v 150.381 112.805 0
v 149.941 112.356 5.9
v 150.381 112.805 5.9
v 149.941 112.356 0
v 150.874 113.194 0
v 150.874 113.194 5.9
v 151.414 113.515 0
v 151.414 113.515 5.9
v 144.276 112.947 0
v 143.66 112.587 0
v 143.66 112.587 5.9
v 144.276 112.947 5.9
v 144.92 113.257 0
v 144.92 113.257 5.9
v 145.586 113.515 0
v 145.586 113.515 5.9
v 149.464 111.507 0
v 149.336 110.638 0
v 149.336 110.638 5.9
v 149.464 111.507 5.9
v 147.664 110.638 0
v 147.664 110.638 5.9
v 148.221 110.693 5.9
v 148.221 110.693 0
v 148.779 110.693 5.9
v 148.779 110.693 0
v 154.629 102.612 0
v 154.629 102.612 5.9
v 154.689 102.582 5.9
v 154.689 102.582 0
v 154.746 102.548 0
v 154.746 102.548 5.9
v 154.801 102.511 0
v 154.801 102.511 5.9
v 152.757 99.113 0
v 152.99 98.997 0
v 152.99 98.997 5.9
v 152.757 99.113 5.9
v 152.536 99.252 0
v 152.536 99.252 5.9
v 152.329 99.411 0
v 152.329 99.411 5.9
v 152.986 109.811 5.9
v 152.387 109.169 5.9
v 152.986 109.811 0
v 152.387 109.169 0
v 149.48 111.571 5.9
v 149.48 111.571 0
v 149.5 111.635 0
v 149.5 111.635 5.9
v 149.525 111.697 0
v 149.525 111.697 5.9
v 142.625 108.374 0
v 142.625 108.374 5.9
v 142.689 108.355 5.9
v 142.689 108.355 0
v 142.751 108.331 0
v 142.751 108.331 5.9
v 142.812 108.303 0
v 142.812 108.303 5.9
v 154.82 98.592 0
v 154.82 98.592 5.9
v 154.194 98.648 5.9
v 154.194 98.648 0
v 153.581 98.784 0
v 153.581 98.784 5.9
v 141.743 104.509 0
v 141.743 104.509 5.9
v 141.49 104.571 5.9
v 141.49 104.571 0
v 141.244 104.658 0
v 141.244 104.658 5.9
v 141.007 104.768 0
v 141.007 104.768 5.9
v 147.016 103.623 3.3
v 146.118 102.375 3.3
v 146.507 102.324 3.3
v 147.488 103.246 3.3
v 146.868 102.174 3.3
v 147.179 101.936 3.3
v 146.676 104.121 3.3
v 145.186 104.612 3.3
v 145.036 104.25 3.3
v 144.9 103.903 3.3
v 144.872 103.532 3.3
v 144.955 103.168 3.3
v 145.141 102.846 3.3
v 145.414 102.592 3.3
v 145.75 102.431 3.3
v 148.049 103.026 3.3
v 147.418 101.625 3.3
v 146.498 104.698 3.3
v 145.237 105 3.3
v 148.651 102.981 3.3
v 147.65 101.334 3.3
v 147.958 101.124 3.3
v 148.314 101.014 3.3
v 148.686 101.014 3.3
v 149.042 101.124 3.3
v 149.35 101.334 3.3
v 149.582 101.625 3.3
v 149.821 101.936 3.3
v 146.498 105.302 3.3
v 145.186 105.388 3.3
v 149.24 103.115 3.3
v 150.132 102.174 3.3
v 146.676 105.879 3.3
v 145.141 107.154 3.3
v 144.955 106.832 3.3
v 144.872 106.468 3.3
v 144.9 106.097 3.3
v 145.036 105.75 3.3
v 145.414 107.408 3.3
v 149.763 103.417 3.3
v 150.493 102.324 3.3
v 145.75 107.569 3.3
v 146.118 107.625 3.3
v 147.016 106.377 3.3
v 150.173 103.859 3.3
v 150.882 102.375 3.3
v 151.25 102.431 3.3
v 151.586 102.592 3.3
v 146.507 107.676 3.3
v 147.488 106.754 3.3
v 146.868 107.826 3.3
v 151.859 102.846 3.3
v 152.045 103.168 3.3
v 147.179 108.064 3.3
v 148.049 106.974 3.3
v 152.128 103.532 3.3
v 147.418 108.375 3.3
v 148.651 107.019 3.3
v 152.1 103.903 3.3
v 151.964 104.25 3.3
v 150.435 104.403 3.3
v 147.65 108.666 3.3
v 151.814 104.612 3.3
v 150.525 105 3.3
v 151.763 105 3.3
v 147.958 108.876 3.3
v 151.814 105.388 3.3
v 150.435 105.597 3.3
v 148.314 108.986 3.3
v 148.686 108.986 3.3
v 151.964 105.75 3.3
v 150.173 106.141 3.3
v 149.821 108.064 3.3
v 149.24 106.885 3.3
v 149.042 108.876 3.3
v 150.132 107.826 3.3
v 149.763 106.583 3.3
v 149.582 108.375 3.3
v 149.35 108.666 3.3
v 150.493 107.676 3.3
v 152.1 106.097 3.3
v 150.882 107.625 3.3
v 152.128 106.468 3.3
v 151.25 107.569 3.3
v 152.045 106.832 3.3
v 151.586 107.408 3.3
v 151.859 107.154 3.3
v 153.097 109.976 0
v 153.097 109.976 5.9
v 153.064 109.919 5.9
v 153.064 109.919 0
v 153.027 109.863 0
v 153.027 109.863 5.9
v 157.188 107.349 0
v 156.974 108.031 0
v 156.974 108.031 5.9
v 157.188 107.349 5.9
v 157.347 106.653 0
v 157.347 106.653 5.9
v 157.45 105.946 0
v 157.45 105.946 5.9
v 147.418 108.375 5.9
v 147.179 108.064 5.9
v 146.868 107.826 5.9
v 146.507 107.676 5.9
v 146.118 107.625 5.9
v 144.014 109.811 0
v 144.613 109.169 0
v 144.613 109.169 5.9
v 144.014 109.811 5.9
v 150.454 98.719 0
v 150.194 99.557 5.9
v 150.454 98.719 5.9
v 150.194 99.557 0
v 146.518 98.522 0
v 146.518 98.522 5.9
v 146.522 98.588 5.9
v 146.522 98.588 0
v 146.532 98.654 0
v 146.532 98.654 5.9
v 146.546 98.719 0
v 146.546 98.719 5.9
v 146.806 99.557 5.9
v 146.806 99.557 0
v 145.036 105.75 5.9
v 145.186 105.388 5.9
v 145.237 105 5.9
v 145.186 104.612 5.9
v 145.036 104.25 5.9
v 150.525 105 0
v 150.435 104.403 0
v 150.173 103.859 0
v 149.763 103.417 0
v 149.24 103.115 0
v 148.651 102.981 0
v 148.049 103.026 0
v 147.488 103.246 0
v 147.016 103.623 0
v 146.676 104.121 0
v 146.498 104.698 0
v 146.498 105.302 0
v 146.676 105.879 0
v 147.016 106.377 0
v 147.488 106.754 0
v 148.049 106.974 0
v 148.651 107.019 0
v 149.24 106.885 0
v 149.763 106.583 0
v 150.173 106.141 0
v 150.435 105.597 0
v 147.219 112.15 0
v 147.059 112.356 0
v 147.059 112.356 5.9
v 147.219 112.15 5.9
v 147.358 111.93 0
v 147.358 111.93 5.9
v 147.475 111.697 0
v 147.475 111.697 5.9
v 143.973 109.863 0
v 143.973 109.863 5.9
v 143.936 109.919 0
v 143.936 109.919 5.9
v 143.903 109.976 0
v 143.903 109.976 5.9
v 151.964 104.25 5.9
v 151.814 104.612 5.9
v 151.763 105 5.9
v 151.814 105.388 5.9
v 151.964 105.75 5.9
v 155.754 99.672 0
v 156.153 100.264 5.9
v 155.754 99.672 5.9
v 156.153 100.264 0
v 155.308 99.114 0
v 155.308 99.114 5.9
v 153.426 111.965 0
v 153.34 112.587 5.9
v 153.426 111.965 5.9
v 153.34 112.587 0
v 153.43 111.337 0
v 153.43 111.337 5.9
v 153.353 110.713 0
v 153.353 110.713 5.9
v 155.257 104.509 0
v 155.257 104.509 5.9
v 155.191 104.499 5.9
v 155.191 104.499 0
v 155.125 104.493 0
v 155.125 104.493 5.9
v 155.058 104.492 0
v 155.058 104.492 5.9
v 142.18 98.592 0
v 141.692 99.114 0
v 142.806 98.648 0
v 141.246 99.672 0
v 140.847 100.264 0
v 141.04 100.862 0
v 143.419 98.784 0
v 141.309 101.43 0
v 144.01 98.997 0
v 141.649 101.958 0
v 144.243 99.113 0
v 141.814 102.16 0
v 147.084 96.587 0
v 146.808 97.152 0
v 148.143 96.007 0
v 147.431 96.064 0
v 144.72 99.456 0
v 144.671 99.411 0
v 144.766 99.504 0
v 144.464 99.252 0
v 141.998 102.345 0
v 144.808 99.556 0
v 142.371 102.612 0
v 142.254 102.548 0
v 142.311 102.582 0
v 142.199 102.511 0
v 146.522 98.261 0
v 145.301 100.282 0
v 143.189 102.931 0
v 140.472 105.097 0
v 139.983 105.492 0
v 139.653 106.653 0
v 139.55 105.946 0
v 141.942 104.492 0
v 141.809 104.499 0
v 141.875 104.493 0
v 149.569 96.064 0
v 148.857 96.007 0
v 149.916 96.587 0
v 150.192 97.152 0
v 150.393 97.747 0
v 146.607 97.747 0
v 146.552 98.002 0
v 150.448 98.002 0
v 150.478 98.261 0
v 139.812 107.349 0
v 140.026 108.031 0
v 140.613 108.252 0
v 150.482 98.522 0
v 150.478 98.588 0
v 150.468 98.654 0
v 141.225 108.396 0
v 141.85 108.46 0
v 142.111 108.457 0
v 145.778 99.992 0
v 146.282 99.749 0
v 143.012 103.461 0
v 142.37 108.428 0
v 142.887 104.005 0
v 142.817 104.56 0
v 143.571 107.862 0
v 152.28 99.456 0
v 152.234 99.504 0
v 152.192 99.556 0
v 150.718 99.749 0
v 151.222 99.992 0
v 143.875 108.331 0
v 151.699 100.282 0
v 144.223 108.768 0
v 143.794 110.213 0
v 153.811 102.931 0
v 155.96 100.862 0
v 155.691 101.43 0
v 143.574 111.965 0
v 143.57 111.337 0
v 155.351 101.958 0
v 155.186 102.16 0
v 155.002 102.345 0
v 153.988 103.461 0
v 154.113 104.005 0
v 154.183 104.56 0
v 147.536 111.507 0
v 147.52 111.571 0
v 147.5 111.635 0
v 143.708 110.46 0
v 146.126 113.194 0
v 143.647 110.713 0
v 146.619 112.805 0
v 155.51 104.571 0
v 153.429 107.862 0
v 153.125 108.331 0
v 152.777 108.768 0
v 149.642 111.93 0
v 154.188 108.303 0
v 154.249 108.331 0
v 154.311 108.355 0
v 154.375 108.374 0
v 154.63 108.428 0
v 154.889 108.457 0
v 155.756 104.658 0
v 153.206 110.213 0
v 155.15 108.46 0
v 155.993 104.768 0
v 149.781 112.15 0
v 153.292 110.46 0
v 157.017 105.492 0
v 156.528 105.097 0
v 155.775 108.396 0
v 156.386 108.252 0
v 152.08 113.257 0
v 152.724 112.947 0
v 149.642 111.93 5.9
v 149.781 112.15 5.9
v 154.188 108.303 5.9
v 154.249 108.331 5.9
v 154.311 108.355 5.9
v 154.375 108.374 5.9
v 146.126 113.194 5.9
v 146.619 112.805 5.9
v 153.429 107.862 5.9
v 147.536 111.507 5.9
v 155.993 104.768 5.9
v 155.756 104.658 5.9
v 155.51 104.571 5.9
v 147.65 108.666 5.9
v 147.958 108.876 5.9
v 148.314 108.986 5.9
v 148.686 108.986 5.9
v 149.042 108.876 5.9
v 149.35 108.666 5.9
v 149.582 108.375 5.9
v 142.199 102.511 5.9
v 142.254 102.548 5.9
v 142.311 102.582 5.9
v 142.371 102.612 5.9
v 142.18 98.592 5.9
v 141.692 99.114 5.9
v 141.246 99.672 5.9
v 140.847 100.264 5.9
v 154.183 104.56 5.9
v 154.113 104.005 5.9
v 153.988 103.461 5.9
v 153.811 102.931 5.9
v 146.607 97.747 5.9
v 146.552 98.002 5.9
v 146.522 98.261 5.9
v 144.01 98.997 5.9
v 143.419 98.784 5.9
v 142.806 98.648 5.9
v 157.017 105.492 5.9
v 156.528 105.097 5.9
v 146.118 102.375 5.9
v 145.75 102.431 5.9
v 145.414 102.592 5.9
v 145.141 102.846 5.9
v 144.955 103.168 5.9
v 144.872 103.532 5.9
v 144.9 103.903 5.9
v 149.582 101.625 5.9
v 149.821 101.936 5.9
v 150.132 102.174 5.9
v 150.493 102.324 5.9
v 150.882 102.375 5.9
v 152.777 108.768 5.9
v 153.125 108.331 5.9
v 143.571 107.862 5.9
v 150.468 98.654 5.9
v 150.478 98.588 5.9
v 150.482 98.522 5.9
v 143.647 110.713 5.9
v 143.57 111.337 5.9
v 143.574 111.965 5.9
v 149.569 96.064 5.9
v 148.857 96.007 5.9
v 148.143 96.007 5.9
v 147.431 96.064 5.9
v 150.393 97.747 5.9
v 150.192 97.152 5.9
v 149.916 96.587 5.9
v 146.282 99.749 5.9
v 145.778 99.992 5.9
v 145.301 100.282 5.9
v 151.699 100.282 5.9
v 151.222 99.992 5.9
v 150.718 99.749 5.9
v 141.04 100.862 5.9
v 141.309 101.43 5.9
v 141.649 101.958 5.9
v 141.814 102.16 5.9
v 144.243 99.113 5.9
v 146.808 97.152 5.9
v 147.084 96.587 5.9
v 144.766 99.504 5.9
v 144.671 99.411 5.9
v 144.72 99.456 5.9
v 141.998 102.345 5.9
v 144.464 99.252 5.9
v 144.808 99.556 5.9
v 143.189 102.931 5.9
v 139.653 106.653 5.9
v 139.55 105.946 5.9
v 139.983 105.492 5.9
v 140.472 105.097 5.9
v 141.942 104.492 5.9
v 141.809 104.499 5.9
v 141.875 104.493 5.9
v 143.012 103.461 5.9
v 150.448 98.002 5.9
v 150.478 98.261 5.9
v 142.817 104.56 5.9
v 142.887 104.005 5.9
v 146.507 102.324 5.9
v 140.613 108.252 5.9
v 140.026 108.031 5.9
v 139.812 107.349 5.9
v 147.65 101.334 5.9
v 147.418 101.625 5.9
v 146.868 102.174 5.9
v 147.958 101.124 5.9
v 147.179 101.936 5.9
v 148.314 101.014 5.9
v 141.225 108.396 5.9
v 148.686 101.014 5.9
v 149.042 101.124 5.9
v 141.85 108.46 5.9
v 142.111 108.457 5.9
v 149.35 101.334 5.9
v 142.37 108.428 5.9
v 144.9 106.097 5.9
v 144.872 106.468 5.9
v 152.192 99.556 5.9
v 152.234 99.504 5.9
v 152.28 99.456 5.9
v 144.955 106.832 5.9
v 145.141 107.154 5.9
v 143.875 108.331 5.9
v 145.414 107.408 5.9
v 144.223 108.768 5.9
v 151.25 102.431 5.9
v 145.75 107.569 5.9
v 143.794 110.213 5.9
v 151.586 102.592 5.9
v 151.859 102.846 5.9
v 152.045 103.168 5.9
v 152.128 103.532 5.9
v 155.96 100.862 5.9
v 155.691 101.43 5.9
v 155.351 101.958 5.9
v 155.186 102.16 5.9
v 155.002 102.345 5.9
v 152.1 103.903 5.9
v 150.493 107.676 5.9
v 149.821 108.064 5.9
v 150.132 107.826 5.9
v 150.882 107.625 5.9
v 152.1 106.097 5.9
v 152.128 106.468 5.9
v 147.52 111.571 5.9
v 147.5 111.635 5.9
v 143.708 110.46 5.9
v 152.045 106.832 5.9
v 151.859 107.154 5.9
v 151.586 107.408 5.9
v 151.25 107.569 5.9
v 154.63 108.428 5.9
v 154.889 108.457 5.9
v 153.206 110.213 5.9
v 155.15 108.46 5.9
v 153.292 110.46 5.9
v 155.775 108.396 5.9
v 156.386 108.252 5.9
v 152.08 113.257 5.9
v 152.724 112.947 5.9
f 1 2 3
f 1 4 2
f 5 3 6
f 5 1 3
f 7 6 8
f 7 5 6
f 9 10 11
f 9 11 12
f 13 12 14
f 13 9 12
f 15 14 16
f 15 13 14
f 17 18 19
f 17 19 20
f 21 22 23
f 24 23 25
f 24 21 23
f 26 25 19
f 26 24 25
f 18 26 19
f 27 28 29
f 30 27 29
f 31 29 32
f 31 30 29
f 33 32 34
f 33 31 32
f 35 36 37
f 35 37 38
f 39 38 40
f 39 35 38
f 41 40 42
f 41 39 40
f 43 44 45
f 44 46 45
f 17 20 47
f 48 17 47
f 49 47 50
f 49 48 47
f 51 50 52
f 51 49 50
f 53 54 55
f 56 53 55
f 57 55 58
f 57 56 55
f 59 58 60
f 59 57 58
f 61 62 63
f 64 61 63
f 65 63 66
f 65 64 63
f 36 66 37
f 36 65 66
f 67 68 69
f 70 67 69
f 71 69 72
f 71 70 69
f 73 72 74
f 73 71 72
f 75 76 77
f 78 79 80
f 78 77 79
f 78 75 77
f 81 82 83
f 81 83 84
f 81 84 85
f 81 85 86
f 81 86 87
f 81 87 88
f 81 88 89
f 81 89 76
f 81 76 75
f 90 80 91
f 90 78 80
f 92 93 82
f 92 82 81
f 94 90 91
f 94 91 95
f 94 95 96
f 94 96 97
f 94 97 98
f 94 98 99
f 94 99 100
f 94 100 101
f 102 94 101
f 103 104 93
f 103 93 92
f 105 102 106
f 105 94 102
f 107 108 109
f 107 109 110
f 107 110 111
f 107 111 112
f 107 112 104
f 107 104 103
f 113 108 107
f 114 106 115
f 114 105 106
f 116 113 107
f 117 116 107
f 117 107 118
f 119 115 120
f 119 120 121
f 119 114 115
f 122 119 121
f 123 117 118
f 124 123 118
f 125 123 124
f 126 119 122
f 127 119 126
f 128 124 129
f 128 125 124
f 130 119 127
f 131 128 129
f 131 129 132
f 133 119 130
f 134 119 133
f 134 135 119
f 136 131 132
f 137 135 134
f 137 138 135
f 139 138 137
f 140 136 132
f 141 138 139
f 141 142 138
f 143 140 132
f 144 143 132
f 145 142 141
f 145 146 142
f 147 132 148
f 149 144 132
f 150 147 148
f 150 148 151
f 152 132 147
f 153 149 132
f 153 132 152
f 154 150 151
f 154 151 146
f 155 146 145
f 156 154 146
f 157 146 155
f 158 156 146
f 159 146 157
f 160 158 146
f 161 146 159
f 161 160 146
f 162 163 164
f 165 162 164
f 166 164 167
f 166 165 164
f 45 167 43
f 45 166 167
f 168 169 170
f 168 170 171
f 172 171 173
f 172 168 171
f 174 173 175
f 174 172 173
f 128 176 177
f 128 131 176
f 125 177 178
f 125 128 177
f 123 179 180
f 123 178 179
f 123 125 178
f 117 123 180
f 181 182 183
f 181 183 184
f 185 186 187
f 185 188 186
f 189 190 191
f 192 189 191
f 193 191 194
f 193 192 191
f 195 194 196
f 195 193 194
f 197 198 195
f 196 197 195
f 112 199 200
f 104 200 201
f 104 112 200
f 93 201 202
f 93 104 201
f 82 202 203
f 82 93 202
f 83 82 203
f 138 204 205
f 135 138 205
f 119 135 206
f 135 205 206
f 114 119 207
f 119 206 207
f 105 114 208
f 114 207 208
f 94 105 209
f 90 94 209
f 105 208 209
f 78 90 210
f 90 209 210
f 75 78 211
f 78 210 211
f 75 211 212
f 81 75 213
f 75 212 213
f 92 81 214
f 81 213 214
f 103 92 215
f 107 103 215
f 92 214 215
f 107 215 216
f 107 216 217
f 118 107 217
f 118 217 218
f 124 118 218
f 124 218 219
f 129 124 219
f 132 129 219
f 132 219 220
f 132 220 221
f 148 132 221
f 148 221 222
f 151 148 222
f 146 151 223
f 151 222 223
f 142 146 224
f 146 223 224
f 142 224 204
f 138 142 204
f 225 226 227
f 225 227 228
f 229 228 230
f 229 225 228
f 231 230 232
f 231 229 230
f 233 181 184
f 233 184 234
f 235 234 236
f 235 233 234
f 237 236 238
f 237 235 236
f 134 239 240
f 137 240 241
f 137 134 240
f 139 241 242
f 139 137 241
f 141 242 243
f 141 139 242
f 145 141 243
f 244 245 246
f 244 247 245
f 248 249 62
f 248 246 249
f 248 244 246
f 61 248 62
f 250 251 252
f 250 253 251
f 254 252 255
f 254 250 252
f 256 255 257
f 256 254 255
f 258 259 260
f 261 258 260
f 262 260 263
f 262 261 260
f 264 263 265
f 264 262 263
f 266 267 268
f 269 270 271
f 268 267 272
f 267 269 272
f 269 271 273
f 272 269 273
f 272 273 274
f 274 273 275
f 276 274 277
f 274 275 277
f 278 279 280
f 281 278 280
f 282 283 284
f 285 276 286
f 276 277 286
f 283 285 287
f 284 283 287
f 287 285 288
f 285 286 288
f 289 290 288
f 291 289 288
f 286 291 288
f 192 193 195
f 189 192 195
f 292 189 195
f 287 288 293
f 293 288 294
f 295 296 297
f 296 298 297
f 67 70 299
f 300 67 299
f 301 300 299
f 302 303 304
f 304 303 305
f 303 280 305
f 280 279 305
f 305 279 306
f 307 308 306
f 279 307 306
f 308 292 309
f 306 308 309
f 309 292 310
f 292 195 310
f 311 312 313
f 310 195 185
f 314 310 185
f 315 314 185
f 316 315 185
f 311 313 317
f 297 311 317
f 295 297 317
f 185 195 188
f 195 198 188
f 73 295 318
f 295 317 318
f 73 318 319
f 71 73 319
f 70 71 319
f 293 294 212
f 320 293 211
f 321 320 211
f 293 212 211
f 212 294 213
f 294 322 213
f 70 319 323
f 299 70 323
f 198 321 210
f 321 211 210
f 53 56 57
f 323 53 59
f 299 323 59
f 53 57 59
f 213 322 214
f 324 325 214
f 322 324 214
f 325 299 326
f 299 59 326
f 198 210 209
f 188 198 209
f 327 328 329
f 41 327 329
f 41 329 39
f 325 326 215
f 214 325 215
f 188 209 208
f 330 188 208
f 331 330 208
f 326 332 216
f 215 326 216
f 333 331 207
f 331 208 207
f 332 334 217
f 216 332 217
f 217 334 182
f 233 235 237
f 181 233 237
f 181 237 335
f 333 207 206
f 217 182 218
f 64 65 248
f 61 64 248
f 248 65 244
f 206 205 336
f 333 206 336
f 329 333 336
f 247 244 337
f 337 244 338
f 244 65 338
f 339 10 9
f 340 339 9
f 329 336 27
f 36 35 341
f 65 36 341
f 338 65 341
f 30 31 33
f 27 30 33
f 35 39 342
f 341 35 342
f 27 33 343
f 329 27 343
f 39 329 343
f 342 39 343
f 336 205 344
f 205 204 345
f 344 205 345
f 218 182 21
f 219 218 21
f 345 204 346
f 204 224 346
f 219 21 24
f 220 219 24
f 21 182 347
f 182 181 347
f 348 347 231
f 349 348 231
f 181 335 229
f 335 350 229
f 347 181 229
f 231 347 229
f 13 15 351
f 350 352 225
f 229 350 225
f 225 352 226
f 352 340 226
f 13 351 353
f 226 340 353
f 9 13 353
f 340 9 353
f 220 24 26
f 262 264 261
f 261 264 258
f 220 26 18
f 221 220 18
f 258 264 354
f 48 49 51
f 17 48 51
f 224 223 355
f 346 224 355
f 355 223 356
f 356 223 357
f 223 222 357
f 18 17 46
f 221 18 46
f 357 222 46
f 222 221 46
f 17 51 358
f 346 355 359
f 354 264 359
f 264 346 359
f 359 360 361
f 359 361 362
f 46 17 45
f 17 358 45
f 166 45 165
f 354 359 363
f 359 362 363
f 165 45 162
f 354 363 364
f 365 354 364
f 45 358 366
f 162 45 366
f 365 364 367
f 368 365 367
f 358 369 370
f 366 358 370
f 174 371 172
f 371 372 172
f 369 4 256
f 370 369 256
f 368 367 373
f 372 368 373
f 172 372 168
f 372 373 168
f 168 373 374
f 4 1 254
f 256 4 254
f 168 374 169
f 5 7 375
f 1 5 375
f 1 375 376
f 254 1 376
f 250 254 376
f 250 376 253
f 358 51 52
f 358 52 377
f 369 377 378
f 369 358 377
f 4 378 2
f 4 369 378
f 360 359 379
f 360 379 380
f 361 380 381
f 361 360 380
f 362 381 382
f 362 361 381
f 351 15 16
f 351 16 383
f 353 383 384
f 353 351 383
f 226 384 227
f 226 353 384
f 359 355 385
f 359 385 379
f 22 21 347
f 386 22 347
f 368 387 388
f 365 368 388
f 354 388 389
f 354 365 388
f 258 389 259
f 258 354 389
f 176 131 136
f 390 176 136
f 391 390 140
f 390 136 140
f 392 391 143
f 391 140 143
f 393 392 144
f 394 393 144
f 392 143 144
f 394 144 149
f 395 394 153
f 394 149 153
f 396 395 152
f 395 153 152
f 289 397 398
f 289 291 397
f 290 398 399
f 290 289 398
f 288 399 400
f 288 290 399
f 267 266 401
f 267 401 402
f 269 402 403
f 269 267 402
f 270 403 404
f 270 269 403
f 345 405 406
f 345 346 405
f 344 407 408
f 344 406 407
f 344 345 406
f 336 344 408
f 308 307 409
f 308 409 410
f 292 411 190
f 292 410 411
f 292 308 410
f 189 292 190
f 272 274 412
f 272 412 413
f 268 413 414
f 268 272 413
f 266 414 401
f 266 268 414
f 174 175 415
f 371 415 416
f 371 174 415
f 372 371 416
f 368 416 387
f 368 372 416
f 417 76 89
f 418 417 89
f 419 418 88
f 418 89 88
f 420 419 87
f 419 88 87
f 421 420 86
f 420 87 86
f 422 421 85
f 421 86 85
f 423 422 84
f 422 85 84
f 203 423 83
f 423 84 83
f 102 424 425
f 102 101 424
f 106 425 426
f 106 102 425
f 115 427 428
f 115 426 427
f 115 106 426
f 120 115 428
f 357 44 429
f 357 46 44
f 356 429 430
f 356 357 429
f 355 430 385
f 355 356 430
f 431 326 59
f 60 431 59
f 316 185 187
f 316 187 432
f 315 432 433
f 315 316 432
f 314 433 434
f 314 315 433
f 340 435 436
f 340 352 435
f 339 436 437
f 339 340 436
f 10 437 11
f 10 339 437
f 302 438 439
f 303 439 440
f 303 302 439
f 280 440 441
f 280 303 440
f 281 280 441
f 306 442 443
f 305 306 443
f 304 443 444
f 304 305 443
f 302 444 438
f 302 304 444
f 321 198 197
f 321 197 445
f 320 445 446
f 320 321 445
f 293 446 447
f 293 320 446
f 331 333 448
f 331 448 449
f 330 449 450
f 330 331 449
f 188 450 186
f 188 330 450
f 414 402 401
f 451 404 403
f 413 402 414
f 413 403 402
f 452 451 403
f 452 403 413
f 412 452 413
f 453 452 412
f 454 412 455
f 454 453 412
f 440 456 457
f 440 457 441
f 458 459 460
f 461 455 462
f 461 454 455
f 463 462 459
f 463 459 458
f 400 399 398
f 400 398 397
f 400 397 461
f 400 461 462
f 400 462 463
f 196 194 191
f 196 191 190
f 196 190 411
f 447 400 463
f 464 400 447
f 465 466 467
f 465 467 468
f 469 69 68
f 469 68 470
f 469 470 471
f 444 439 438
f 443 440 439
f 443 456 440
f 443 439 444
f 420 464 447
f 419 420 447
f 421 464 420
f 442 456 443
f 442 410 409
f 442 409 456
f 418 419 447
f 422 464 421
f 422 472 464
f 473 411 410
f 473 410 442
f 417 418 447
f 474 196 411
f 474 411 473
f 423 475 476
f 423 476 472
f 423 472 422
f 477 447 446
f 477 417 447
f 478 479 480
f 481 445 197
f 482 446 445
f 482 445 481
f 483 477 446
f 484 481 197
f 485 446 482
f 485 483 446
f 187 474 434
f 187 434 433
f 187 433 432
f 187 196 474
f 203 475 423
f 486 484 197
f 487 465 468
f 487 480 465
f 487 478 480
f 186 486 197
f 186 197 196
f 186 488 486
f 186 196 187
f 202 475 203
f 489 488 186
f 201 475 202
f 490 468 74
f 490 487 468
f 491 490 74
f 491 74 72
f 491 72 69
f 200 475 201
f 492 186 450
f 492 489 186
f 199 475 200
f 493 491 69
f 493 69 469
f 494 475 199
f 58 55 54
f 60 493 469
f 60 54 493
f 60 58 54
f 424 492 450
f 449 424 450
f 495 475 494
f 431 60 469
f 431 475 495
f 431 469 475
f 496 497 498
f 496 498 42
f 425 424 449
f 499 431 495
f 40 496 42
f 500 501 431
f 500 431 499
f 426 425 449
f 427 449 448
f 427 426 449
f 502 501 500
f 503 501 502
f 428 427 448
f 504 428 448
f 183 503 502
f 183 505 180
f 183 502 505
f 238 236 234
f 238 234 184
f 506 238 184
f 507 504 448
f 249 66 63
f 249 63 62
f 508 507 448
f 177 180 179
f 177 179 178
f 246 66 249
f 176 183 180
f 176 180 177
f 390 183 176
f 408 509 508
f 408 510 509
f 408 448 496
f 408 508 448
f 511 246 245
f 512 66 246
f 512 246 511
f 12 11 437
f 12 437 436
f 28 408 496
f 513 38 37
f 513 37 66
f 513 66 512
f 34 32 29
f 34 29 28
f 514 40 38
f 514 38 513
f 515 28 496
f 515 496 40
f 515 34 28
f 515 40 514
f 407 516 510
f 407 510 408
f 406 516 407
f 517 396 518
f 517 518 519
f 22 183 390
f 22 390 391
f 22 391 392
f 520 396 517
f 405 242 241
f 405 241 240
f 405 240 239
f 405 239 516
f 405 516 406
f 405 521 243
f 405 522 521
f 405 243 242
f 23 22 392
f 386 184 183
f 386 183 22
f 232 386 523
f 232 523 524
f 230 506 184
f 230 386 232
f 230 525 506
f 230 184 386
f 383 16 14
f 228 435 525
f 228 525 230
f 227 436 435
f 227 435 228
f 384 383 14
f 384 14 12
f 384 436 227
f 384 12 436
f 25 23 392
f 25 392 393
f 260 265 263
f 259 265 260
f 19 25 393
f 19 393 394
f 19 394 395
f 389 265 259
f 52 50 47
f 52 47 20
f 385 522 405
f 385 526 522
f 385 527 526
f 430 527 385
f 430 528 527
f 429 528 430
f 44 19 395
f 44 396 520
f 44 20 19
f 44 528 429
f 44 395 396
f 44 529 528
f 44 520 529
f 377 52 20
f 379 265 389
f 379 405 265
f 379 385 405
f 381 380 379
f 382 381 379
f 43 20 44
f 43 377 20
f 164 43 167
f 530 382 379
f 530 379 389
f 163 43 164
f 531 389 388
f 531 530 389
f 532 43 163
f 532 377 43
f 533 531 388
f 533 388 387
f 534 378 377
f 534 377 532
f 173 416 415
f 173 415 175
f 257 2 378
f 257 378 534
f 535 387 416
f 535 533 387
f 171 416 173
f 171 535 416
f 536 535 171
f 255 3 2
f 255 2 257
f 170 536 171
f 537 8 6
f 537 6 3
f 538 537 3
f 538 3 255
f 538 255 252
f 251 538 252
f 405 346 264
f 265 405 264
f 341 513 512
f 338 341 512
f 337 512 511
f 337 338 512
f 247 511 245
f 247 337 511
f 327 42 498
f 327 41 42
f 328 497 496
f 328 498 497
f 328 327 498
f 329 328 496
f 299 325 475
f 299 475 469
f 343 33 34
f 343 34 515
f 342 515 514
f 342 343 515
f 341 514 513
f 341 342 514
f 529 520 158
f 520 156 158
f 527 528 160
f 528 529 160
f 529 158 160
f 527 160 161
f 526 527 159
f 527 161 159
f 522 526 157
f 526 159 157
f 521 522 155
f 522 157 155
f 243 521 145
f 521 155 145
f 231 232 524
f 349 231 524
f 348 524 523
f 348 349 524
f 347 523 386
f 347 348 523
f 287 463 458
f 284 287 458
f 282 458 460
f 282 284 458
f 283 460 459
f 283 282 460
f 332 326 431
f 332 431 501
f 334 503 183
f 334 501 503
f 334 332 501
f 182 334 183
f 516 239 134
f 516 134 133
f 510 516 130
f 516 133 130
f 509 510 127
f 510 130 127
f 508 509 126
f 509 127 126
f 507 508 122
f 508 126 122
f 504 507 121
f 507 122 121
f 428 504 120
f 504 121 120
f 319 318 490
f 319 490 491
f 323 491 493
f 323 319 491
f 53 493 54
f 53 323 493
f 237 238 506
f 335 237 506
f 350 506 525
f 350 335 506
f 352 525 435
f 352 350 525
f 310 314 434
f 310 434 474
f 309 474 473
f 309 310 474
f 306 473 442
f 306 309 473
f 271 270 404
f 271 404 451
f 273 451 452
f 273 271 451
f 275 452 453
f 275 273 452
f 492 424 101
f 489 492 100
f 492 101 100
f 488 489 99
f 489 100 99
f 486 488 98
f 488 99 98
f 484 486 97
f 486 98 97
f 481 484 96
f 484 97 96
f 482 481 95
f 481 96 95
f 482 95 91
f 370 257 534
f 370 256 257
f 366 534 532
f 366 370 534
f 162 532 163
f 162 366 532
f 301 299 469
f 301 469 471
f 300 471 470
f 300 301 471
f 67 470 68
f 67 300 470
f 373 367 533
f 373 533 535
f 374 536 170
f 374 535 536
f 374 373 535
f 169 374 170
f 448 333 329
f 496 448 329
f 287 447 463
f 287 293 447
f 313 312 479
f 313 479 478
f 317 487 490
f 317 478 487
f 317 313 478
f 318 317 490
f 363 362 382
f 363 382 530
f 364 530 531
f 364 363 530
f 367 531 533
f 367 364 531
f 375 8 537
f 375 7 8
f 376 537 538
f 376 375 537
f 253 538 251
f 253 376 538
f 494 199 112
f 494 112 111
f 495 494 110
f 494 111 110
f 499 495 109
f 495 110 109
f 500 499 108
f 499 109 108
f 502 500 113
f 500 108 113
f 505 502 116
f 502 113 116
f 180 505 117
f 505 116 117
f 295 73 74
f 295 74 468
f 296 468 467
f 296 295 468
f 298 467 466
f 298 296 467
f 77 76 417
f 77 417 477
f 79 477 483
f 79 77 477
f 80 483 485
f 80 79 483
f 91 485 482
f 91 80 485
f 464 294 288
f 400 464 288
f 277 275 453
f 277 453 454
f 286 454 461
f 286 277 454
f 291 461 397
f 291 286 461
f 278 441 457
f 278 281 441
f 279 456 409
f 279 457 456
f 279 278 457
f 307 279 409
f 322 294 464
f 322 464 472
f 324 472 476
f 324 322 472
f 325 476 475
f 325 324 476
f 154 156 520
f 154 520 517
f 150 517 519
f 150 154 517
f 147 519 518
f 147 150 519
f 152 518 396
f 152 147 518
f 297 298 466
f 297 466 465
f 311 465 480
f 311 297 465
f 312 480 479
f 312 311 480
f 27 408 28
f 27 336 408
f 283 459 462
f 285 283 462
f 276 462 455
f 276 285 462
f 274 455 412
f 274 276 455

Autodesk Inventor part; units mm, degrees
ref_plane "YZ Plane" through (0, 0, 0) normal (1, 0, 0) x (0, 1, 0)
ref_plane "XZ Plane" through (0, 0, 0) normal (0, 1, 0) x (-1, 0, 0)
ref_plane "XY Plane" through (0, 0, 0) normal (0, 0, 1) x (1, 0, 0)
sketch "スケッチ1" plane through (0, 0, 0) normal (0, 0, 1) x (1, 0, 0)
  arc A0 (149.5249, 111.6966) -> (149.4642, 111.5067) centre (150.3865, 111.3165) ccw
  arc A1 (149.9412, 112.3564) -> (149.5249, 111.6966) centre (151.9548, 110.6246) ccw
  arc A2 (151.4141, 113.5151) -> (149.9412, 112.3564) centre (153.6271, 109.1863) ccw
  arc A3 (143.9033, 109.9765) -> (144.0139, 109.8107) centre (144.7377, 110.4132) ccw
  arc A4 (143.647, 110.7134) -> (143.9033, 109.9765) centre (146.2564, 111.2079) ccw
  arc A5 (143.6595, 112.5874) -> (143.647, 110.7134) centre (148.4237, 111.6186) ccw
  arc A6 (141.7431, 104.509) -> (141.9418, 104.492) centre (141.922, 105.4335) ccw
  arc A7 (141.0072, 104.768) -> (141.7431, 104.509) centre (142.2475, 107.1165) ccw
  arc A8 (139.5499, 105.9462) -> (141.0072, 104.768) centre (143.2777, 109.0669) ccw
  arc A9 (144.671, 99.4111) -> (144.8081, 99.5559) centre (144.0597, 100.1274) ccw
  arc A10 (144.0096, 98.9973) -> (144.671, 99.4111) centre (142.9469, 101.4312) ccw
  arc A11 (142.1798, 98.5924) -> (144.0096, 98.9973) centre (142.0642, 103.4527) ccw
  arc A12 (150.4822, 98.5217) -> (150.4545, 98.7192) centre (149.541, 98.4903) ccw
  arc A13 (150.3933, 97.7466) -> (150.4822, 98.5217) centre (147.8278, 98.4333) ccw
  arc A14 (149.569, 96.0636) -> (150.3933, 97.7466) centre (145.697, 99.0035) ccw
  arc A15 (154.8007, 102.5106) -> (154.6291, 102.612) centre (154.2384, 101.7552) ccw
  arc A16 (155.3513, 101.9579) -> (154.8007, 102.5106) centre (153.2149, 100.3801) ccw
  arc A17 (156.1532, 100.264) -> (155.3513, 101.9579) centre (151.4405, 99.0698) ccw
  arc A18 (154.3747, 108.3739) -> (154.1884, 108.303) centre (154.6147, 107.4633) ccw
  arc A19 (155.1501, 108.4598) -> (154.3747, 108.3739) centre (155.0516, 105.8058) ccw
  arc A20 (156.9743, 108.0306) -> (155.1501, 108.4598) centre (154.9697, 103.6015) ccw
  arc A21 (147.5358, 111.5067) -> (147.4751, 111.6966) centre (146.6135, 111.3165) ccw
  arc A22 (147.4751, 111.6966) -> (147.0588, 112.3564) centre (145.0452, 110.6246) ccw
  arc A23 (147.0588, 112.3564) -> (145.5858, 113.5151) centre (143.3729, 109.1863) ccw
  arc A24 (142.8116, 108.303) -> (142.6253, 108.3739) centre (142.3853, 107.4633) ccw
  arc A25 (142.6253, 108.3739) -> (141.8499, 108.4598) centre (141.9484, 105.8058) ccw
  arc A26 (141.8499, 108.4598) -> (140.0256, 108.0306) centre (142.0302, 103.6015) ccw
  arc A27 (142.3709, 102.612) -> (142.1993, 102.5106) centre (142.7615, 101.7552) ccw
  arc A28 (142.1993, 102.5106) -> (141.6486, 101.9579) centre (143.7851, 100.3801) ccw
  arc A29 (141.6486, 101.9579) -> (140.8468, 100.264) centre (145.5595, 99.0698) ccw
  arc A30 (146.5455, 98.7192) -> (146.5178, 98.5217) centre (147.459, 98.4903) ccw
  arc A31 (146.5178, 98.5217) -> (146.6066, 97.7466) centre (149.1722, 98.4333) ccw
  arc A32 (146.6066, 97.7466) -> (147.431, 96.0636) centre (151.303, 99.0035) ccw
  arc A33 (152.1919, 99.5559) -> (152.329, 99.4111) centre (152.9403, 100.1274) ccw
  arc A34 (152.329, 99.4111) -> (152.9903, 98.9973) centre (154.0531, 101.4312) ccw
  arc A35 (152.9903, 98.9973) -> (154.8201, 98.5924) centre (154.9358, 103.4527) ccw
  arc A36 (155.0582, 104.492) -> (155.2568, 104.509) centre (155.078, 105.4335) ccw
  arc A37 (155.2568, 104.509) -> (155.9927, 104.768) centre (154.7524, 107.1165) ccw
  arc A38 (155.9927, 104.768) -> (157.4501, 105.9462) centre (153.7223, 109.0669) ccw
  arc A39 (152.986, 109.8107) -> (153.0967, 109.9765) centre (152.2623, 110.4132) ccw
  arc A40 (153.0967, 109.9765) -> (153.3529, 110.7134) centre (150.7435, 111.2079) ccw
  arc A41 (153.3529, 110.7134) -> (153.3404, 112.5874) centre (148.5763, 111.6186) ccw
  arc A42 (149.3355, 110.6383) -> (147.6645, 110.6383) centre (148.5, 104.9999) ccw
  arc A43 (144.6126, 109.1687) -> (143.5707, 107.8622) centre (148.5, 104.9999) ccw
  arc A44 (142.817, 104.5598) -> (143.1888, 102.9307) centre (148.5, 104.9999) ccw
  arc A45 (145.3008, 100.2824) -> (146.8063, 99.5573) centre (148.5, 104.9999) ccw
  arc A46 (150.1936, 99.5573) -> (151.6992, 100.2824) centre (148.5, 104.9999) ccw
  arc A47 (153.8111, 102.9307) -> (154.183, 104.5598) centre (148.5, 104.9999) ccw
  arc A48 (153.4292, 107.8622) -> (152.3873, 109.1687) centre (148.5, 104.9999) ccw
  arc A49 (145.5858, 113.5151) -> (143.6595, 112.5874) centre (148.5, 104.9999) ccw
  arc A50 (140.0256, 108.0306) -> (139.5499, 105.9462) centre (148.5, 104.9999) ccw
  arc A51 (140.8468, 100.264) -> (142.1798, 98.5924) centre (148.5, 104.9999) ccw
  arc A52 (147.431, 96.0636) -> (149.569, 96.0636) centre (148.5, 104.9999) ccw
  arc A53 (154.8201, 98.5924) -> (156.1532, 100.264) centre (148.5, 104.9999) ccw
  arc A54 (157.4501, 105.9462) -> (156.9743, 108.0306) centre (148.5, 104.9999) ccw
  arc A55 (153.3404, 112.5874) -> (151.4141, 113.5151) centre (148.5, 104.9999) ccw
  line L0 (149.3355, 110.6383) -> (149.4642, 111.5067)
  line L1 (144.6126, 109.1687) -> (144.0139, 109.8107)
  line L2 (142.817, 104.5598) -> (141.9418, 104.492)
  line L3 (145.3008, 100.2824) -> (144.8081, 99.5559)
  line L4 (150.1936, 99.5573) -> (150.4545, 98.7192)
  line L5 (153.8111, 102.9307) -> (154.6291, 102.612)
  line L6 (153.4292, 107.8622) -> (154.1884, 108.303)
  line L7 (147.6645, 110.6383) -> (147.5358, 111.5067)
  line L8 (143.5707, 107.8622) -> (142.8116, 108.303)
  line L9 (143.1888, 102.9307) -> (142.3709, 102.612)
  line L10 (146.8063, 99.5573) -> (146.5455, 98.7192)
  line L11 (151.6992, 100.2824) -> (152.1919, 99.5559)
  line L12 (154.183, 104.5598) -> (155.0582, 104.492)
  line L13 (152.3873, 109.1687) -> (152.986, 109.8107)
  line L14 (137.5, 105) -> (159.5, 105)
  line L15 (148.5, 94) -> (148.5, 116)
  line L16 (177.5, 113.9999) -> (247.5, 113.9999)
  line L17 (177.5, 105.9999) -> (247.5, 105.9999)
  line L18 (177.5, 97.9999) -> (247.5, 97.9999)
  line L19 (177.5, 89.9999) -> (247.5, 89.9999)
  line L20 (177.5, 81.9999) -> (247.5, 81.9999)
  line L21 (177.5, 73.9999) -> (247.5, 73.9999)
  line L22 (177.5, 65.9999) -> (247.5, 65.9999)
  line L23 (177.5, 57.9999) -> (247.5, 57.9999)
  line L24 (177.5, 49.9999) -> (247.5, 49.9999)
  line L25 (177.5, 41.9999) -> (247.5, 41.9999)
  line L26 (177.5, 33.9999) -> (247.5, 33.9999)
  line L27 (177.5, 25.9999) -> (247.5, 25.9999)
  line L28 (177.5, 17.9999) -> (247.5, 17.9999)
  line L29 (177.5, 113.9999) -> (177.5, 17.9999)
  line L30 (247.5, 113.9999) -> (247.5, 17.9999)
  line L31 (212.5, 105.9999) -> (212.5, 17.9999)
  arc A56 (151.9641, 105.75) -> (150.8816, 107.625) centre (150.8816, 106.375) ccw
  arc A57 (151.9641, 105.75) -> (151.9641, 104.25) centre (153.2631, 105) ccw
  arc A58 (150.8816, 102.375) -> (151.9641, 104.25) centre (150.8816, 103.625) ccw
  arc A59 (147.4175, 101.625) -> (149.5825, 101.625) centre (148.5, 102.25) ccw
  arc A60 (150.8816, 102.375) -> (149.5825, 101.625) centre (150.8816, 100.875) ccw
  arc A61 (147.4175, 101.625) -> (146.1184, 102.375) centre (146.1184, 100.875) ccw
  arc A62 (146.1184, 107.625) -> (145.0359, 105.75) centre (146.1184, 106.375) ccw
  arc A63 (146.1184, 107.625) -> (147.4175, 108.375) centre (146.1184, 109.125) ccw
  line L32 (145.0359, 107) -> (148.5, 109) construction
  circle A64 centre (148.5, 105) radius 5 construction
  arc A65 (149.5825, 108.375) -> (147.4175, 108.375) centre (148.5, 107.75) ccw
  arc A66 (145.0359, 104.25) -> (145.0359, 105.75) centre (143.7369, 105) ccw
  arc A67 (149.5825, 108.375) -> (150.8816, 107.625) centre (150.8816, 109.125) ccw
  line L33 (145.0359, 103) -> (145.0359, 107) construction
  arc A68 (145.0359, 104.25) -> (146.1184, 102.375) centre (146.1184, 103.625) ccw
  line L34 (148.5, 109) -> (151.9641, 107) construction
  line L35 (148.5, 101) -> (145.0359, 103) construction
  circle A69 centre (148.5, 105) radius 4 construction
  circle A70 centre (148.5, 105) radius 3.2631 construction
  line L36 (151.9641, 103) -> (148.5, 101) construction
  line L37 (151.9641, 107) -> (151.9641, 103) construction
  circle A71 centre (148.5, 105) radius 2.025
  point P0 (0, 0)
  point P1 (183.5, 108)
  point P2 (186, 100)
  point P3 (186, 92)
  point P4 (183.5, 84)
  point P5 (186, 76)
  point P6 (181, 68)
  point P7 (183.5, 60)
  point P8 (183.5, 52)
  point P9 (183.5, 44)
  point P10 (186, 36)
  point P11 (186, 28)
  point P12 (183.5, 20)
  point P13 (213.5, 100)
  point P14 (229.75, 92)
  point P15 (229.75, 84)
  point P16 (226, 76)
  point P17 (228.5, 68)
  point P18 (222.25, 60)
  point P19 (228.5, 52)
  point P20 (226, 44)
  point P21 (223.5, 36)
  point P22 (231, 28)
  point P23 (231, 20)
  point P24 (149.5, 129.5)
  point P25 (149.5, 123.5)
  point P26 (166.75, 129.5)
  point P27 (168.875, 123.5)
  point P28 (151.9641, 107)
  point P29 (151.9641, 103)
  point P30 (148.5, 101)
  point P31 (145.0359, 103)
  point P32 (151.9641, 105.75)
  point P33 (151.9641, 104.25)
  point P34 (150.8816, 102.375)
  point P35 (149.5825, 101.625)
  point P36 (147.4175, 101.625)
  point P37 (146.1184, 102.375)
  point P38 (145.0359, 104.25)
  point P39 (145.0359, 105.75)
  point P40 (146.1184, 107.625)
  dimension "d5" = 8
  dimension "d4" = 10
  dimension "d6" = 360
  dimension "d7" = 360
  dimension "d8" = 6.5263
  dimension "d9" = 1.5
  dimension "d10" = 1.25
  dimension "d11" = 4.05
extrude "押し出し1" add sketch "スケッチ1" along normal blind 5.9 contours A1 A2 A55 A41 A40 A39 L13 A48 L6 A18 A19 A20 A54 A38 L14 A57 A56 A67 A65 L15 A42 L0 A0 | L15 A65 A63 A62 A66 L14 A8 A50 A26 A25 A24 L8 A43 L1 A3 A4 A5 A49 A23 A22 A21 L7 A42 | L14 A38 A37 A36 L12 A47 L5 A15 A16 A17 A53 A35 A34 A33 L11 A46 L4 A12 A13 A14 A52 L15 A59 A60 A58 A57 | A66 A68 A61 A59 L15 A52 A32 A31 A30 L10 A45 L3 A9 A10 A11 A51 A29 A28 A27 L9 A44 L2 A6 A7 A8 L14
extrude "押し出し2" add sketch "スケッチ1" along normal blind 3.3 contours A65 A67 A56 A57 L14 A71 L15 | L15 A71 L14 A66 A62 A63 A65 | L14 A57 A58 A60 A59 L15 A71 | A71 L15 A59 A61 A68 A66 L14
properties part number "m2z7" material "アルミニウム 2014-T4"
